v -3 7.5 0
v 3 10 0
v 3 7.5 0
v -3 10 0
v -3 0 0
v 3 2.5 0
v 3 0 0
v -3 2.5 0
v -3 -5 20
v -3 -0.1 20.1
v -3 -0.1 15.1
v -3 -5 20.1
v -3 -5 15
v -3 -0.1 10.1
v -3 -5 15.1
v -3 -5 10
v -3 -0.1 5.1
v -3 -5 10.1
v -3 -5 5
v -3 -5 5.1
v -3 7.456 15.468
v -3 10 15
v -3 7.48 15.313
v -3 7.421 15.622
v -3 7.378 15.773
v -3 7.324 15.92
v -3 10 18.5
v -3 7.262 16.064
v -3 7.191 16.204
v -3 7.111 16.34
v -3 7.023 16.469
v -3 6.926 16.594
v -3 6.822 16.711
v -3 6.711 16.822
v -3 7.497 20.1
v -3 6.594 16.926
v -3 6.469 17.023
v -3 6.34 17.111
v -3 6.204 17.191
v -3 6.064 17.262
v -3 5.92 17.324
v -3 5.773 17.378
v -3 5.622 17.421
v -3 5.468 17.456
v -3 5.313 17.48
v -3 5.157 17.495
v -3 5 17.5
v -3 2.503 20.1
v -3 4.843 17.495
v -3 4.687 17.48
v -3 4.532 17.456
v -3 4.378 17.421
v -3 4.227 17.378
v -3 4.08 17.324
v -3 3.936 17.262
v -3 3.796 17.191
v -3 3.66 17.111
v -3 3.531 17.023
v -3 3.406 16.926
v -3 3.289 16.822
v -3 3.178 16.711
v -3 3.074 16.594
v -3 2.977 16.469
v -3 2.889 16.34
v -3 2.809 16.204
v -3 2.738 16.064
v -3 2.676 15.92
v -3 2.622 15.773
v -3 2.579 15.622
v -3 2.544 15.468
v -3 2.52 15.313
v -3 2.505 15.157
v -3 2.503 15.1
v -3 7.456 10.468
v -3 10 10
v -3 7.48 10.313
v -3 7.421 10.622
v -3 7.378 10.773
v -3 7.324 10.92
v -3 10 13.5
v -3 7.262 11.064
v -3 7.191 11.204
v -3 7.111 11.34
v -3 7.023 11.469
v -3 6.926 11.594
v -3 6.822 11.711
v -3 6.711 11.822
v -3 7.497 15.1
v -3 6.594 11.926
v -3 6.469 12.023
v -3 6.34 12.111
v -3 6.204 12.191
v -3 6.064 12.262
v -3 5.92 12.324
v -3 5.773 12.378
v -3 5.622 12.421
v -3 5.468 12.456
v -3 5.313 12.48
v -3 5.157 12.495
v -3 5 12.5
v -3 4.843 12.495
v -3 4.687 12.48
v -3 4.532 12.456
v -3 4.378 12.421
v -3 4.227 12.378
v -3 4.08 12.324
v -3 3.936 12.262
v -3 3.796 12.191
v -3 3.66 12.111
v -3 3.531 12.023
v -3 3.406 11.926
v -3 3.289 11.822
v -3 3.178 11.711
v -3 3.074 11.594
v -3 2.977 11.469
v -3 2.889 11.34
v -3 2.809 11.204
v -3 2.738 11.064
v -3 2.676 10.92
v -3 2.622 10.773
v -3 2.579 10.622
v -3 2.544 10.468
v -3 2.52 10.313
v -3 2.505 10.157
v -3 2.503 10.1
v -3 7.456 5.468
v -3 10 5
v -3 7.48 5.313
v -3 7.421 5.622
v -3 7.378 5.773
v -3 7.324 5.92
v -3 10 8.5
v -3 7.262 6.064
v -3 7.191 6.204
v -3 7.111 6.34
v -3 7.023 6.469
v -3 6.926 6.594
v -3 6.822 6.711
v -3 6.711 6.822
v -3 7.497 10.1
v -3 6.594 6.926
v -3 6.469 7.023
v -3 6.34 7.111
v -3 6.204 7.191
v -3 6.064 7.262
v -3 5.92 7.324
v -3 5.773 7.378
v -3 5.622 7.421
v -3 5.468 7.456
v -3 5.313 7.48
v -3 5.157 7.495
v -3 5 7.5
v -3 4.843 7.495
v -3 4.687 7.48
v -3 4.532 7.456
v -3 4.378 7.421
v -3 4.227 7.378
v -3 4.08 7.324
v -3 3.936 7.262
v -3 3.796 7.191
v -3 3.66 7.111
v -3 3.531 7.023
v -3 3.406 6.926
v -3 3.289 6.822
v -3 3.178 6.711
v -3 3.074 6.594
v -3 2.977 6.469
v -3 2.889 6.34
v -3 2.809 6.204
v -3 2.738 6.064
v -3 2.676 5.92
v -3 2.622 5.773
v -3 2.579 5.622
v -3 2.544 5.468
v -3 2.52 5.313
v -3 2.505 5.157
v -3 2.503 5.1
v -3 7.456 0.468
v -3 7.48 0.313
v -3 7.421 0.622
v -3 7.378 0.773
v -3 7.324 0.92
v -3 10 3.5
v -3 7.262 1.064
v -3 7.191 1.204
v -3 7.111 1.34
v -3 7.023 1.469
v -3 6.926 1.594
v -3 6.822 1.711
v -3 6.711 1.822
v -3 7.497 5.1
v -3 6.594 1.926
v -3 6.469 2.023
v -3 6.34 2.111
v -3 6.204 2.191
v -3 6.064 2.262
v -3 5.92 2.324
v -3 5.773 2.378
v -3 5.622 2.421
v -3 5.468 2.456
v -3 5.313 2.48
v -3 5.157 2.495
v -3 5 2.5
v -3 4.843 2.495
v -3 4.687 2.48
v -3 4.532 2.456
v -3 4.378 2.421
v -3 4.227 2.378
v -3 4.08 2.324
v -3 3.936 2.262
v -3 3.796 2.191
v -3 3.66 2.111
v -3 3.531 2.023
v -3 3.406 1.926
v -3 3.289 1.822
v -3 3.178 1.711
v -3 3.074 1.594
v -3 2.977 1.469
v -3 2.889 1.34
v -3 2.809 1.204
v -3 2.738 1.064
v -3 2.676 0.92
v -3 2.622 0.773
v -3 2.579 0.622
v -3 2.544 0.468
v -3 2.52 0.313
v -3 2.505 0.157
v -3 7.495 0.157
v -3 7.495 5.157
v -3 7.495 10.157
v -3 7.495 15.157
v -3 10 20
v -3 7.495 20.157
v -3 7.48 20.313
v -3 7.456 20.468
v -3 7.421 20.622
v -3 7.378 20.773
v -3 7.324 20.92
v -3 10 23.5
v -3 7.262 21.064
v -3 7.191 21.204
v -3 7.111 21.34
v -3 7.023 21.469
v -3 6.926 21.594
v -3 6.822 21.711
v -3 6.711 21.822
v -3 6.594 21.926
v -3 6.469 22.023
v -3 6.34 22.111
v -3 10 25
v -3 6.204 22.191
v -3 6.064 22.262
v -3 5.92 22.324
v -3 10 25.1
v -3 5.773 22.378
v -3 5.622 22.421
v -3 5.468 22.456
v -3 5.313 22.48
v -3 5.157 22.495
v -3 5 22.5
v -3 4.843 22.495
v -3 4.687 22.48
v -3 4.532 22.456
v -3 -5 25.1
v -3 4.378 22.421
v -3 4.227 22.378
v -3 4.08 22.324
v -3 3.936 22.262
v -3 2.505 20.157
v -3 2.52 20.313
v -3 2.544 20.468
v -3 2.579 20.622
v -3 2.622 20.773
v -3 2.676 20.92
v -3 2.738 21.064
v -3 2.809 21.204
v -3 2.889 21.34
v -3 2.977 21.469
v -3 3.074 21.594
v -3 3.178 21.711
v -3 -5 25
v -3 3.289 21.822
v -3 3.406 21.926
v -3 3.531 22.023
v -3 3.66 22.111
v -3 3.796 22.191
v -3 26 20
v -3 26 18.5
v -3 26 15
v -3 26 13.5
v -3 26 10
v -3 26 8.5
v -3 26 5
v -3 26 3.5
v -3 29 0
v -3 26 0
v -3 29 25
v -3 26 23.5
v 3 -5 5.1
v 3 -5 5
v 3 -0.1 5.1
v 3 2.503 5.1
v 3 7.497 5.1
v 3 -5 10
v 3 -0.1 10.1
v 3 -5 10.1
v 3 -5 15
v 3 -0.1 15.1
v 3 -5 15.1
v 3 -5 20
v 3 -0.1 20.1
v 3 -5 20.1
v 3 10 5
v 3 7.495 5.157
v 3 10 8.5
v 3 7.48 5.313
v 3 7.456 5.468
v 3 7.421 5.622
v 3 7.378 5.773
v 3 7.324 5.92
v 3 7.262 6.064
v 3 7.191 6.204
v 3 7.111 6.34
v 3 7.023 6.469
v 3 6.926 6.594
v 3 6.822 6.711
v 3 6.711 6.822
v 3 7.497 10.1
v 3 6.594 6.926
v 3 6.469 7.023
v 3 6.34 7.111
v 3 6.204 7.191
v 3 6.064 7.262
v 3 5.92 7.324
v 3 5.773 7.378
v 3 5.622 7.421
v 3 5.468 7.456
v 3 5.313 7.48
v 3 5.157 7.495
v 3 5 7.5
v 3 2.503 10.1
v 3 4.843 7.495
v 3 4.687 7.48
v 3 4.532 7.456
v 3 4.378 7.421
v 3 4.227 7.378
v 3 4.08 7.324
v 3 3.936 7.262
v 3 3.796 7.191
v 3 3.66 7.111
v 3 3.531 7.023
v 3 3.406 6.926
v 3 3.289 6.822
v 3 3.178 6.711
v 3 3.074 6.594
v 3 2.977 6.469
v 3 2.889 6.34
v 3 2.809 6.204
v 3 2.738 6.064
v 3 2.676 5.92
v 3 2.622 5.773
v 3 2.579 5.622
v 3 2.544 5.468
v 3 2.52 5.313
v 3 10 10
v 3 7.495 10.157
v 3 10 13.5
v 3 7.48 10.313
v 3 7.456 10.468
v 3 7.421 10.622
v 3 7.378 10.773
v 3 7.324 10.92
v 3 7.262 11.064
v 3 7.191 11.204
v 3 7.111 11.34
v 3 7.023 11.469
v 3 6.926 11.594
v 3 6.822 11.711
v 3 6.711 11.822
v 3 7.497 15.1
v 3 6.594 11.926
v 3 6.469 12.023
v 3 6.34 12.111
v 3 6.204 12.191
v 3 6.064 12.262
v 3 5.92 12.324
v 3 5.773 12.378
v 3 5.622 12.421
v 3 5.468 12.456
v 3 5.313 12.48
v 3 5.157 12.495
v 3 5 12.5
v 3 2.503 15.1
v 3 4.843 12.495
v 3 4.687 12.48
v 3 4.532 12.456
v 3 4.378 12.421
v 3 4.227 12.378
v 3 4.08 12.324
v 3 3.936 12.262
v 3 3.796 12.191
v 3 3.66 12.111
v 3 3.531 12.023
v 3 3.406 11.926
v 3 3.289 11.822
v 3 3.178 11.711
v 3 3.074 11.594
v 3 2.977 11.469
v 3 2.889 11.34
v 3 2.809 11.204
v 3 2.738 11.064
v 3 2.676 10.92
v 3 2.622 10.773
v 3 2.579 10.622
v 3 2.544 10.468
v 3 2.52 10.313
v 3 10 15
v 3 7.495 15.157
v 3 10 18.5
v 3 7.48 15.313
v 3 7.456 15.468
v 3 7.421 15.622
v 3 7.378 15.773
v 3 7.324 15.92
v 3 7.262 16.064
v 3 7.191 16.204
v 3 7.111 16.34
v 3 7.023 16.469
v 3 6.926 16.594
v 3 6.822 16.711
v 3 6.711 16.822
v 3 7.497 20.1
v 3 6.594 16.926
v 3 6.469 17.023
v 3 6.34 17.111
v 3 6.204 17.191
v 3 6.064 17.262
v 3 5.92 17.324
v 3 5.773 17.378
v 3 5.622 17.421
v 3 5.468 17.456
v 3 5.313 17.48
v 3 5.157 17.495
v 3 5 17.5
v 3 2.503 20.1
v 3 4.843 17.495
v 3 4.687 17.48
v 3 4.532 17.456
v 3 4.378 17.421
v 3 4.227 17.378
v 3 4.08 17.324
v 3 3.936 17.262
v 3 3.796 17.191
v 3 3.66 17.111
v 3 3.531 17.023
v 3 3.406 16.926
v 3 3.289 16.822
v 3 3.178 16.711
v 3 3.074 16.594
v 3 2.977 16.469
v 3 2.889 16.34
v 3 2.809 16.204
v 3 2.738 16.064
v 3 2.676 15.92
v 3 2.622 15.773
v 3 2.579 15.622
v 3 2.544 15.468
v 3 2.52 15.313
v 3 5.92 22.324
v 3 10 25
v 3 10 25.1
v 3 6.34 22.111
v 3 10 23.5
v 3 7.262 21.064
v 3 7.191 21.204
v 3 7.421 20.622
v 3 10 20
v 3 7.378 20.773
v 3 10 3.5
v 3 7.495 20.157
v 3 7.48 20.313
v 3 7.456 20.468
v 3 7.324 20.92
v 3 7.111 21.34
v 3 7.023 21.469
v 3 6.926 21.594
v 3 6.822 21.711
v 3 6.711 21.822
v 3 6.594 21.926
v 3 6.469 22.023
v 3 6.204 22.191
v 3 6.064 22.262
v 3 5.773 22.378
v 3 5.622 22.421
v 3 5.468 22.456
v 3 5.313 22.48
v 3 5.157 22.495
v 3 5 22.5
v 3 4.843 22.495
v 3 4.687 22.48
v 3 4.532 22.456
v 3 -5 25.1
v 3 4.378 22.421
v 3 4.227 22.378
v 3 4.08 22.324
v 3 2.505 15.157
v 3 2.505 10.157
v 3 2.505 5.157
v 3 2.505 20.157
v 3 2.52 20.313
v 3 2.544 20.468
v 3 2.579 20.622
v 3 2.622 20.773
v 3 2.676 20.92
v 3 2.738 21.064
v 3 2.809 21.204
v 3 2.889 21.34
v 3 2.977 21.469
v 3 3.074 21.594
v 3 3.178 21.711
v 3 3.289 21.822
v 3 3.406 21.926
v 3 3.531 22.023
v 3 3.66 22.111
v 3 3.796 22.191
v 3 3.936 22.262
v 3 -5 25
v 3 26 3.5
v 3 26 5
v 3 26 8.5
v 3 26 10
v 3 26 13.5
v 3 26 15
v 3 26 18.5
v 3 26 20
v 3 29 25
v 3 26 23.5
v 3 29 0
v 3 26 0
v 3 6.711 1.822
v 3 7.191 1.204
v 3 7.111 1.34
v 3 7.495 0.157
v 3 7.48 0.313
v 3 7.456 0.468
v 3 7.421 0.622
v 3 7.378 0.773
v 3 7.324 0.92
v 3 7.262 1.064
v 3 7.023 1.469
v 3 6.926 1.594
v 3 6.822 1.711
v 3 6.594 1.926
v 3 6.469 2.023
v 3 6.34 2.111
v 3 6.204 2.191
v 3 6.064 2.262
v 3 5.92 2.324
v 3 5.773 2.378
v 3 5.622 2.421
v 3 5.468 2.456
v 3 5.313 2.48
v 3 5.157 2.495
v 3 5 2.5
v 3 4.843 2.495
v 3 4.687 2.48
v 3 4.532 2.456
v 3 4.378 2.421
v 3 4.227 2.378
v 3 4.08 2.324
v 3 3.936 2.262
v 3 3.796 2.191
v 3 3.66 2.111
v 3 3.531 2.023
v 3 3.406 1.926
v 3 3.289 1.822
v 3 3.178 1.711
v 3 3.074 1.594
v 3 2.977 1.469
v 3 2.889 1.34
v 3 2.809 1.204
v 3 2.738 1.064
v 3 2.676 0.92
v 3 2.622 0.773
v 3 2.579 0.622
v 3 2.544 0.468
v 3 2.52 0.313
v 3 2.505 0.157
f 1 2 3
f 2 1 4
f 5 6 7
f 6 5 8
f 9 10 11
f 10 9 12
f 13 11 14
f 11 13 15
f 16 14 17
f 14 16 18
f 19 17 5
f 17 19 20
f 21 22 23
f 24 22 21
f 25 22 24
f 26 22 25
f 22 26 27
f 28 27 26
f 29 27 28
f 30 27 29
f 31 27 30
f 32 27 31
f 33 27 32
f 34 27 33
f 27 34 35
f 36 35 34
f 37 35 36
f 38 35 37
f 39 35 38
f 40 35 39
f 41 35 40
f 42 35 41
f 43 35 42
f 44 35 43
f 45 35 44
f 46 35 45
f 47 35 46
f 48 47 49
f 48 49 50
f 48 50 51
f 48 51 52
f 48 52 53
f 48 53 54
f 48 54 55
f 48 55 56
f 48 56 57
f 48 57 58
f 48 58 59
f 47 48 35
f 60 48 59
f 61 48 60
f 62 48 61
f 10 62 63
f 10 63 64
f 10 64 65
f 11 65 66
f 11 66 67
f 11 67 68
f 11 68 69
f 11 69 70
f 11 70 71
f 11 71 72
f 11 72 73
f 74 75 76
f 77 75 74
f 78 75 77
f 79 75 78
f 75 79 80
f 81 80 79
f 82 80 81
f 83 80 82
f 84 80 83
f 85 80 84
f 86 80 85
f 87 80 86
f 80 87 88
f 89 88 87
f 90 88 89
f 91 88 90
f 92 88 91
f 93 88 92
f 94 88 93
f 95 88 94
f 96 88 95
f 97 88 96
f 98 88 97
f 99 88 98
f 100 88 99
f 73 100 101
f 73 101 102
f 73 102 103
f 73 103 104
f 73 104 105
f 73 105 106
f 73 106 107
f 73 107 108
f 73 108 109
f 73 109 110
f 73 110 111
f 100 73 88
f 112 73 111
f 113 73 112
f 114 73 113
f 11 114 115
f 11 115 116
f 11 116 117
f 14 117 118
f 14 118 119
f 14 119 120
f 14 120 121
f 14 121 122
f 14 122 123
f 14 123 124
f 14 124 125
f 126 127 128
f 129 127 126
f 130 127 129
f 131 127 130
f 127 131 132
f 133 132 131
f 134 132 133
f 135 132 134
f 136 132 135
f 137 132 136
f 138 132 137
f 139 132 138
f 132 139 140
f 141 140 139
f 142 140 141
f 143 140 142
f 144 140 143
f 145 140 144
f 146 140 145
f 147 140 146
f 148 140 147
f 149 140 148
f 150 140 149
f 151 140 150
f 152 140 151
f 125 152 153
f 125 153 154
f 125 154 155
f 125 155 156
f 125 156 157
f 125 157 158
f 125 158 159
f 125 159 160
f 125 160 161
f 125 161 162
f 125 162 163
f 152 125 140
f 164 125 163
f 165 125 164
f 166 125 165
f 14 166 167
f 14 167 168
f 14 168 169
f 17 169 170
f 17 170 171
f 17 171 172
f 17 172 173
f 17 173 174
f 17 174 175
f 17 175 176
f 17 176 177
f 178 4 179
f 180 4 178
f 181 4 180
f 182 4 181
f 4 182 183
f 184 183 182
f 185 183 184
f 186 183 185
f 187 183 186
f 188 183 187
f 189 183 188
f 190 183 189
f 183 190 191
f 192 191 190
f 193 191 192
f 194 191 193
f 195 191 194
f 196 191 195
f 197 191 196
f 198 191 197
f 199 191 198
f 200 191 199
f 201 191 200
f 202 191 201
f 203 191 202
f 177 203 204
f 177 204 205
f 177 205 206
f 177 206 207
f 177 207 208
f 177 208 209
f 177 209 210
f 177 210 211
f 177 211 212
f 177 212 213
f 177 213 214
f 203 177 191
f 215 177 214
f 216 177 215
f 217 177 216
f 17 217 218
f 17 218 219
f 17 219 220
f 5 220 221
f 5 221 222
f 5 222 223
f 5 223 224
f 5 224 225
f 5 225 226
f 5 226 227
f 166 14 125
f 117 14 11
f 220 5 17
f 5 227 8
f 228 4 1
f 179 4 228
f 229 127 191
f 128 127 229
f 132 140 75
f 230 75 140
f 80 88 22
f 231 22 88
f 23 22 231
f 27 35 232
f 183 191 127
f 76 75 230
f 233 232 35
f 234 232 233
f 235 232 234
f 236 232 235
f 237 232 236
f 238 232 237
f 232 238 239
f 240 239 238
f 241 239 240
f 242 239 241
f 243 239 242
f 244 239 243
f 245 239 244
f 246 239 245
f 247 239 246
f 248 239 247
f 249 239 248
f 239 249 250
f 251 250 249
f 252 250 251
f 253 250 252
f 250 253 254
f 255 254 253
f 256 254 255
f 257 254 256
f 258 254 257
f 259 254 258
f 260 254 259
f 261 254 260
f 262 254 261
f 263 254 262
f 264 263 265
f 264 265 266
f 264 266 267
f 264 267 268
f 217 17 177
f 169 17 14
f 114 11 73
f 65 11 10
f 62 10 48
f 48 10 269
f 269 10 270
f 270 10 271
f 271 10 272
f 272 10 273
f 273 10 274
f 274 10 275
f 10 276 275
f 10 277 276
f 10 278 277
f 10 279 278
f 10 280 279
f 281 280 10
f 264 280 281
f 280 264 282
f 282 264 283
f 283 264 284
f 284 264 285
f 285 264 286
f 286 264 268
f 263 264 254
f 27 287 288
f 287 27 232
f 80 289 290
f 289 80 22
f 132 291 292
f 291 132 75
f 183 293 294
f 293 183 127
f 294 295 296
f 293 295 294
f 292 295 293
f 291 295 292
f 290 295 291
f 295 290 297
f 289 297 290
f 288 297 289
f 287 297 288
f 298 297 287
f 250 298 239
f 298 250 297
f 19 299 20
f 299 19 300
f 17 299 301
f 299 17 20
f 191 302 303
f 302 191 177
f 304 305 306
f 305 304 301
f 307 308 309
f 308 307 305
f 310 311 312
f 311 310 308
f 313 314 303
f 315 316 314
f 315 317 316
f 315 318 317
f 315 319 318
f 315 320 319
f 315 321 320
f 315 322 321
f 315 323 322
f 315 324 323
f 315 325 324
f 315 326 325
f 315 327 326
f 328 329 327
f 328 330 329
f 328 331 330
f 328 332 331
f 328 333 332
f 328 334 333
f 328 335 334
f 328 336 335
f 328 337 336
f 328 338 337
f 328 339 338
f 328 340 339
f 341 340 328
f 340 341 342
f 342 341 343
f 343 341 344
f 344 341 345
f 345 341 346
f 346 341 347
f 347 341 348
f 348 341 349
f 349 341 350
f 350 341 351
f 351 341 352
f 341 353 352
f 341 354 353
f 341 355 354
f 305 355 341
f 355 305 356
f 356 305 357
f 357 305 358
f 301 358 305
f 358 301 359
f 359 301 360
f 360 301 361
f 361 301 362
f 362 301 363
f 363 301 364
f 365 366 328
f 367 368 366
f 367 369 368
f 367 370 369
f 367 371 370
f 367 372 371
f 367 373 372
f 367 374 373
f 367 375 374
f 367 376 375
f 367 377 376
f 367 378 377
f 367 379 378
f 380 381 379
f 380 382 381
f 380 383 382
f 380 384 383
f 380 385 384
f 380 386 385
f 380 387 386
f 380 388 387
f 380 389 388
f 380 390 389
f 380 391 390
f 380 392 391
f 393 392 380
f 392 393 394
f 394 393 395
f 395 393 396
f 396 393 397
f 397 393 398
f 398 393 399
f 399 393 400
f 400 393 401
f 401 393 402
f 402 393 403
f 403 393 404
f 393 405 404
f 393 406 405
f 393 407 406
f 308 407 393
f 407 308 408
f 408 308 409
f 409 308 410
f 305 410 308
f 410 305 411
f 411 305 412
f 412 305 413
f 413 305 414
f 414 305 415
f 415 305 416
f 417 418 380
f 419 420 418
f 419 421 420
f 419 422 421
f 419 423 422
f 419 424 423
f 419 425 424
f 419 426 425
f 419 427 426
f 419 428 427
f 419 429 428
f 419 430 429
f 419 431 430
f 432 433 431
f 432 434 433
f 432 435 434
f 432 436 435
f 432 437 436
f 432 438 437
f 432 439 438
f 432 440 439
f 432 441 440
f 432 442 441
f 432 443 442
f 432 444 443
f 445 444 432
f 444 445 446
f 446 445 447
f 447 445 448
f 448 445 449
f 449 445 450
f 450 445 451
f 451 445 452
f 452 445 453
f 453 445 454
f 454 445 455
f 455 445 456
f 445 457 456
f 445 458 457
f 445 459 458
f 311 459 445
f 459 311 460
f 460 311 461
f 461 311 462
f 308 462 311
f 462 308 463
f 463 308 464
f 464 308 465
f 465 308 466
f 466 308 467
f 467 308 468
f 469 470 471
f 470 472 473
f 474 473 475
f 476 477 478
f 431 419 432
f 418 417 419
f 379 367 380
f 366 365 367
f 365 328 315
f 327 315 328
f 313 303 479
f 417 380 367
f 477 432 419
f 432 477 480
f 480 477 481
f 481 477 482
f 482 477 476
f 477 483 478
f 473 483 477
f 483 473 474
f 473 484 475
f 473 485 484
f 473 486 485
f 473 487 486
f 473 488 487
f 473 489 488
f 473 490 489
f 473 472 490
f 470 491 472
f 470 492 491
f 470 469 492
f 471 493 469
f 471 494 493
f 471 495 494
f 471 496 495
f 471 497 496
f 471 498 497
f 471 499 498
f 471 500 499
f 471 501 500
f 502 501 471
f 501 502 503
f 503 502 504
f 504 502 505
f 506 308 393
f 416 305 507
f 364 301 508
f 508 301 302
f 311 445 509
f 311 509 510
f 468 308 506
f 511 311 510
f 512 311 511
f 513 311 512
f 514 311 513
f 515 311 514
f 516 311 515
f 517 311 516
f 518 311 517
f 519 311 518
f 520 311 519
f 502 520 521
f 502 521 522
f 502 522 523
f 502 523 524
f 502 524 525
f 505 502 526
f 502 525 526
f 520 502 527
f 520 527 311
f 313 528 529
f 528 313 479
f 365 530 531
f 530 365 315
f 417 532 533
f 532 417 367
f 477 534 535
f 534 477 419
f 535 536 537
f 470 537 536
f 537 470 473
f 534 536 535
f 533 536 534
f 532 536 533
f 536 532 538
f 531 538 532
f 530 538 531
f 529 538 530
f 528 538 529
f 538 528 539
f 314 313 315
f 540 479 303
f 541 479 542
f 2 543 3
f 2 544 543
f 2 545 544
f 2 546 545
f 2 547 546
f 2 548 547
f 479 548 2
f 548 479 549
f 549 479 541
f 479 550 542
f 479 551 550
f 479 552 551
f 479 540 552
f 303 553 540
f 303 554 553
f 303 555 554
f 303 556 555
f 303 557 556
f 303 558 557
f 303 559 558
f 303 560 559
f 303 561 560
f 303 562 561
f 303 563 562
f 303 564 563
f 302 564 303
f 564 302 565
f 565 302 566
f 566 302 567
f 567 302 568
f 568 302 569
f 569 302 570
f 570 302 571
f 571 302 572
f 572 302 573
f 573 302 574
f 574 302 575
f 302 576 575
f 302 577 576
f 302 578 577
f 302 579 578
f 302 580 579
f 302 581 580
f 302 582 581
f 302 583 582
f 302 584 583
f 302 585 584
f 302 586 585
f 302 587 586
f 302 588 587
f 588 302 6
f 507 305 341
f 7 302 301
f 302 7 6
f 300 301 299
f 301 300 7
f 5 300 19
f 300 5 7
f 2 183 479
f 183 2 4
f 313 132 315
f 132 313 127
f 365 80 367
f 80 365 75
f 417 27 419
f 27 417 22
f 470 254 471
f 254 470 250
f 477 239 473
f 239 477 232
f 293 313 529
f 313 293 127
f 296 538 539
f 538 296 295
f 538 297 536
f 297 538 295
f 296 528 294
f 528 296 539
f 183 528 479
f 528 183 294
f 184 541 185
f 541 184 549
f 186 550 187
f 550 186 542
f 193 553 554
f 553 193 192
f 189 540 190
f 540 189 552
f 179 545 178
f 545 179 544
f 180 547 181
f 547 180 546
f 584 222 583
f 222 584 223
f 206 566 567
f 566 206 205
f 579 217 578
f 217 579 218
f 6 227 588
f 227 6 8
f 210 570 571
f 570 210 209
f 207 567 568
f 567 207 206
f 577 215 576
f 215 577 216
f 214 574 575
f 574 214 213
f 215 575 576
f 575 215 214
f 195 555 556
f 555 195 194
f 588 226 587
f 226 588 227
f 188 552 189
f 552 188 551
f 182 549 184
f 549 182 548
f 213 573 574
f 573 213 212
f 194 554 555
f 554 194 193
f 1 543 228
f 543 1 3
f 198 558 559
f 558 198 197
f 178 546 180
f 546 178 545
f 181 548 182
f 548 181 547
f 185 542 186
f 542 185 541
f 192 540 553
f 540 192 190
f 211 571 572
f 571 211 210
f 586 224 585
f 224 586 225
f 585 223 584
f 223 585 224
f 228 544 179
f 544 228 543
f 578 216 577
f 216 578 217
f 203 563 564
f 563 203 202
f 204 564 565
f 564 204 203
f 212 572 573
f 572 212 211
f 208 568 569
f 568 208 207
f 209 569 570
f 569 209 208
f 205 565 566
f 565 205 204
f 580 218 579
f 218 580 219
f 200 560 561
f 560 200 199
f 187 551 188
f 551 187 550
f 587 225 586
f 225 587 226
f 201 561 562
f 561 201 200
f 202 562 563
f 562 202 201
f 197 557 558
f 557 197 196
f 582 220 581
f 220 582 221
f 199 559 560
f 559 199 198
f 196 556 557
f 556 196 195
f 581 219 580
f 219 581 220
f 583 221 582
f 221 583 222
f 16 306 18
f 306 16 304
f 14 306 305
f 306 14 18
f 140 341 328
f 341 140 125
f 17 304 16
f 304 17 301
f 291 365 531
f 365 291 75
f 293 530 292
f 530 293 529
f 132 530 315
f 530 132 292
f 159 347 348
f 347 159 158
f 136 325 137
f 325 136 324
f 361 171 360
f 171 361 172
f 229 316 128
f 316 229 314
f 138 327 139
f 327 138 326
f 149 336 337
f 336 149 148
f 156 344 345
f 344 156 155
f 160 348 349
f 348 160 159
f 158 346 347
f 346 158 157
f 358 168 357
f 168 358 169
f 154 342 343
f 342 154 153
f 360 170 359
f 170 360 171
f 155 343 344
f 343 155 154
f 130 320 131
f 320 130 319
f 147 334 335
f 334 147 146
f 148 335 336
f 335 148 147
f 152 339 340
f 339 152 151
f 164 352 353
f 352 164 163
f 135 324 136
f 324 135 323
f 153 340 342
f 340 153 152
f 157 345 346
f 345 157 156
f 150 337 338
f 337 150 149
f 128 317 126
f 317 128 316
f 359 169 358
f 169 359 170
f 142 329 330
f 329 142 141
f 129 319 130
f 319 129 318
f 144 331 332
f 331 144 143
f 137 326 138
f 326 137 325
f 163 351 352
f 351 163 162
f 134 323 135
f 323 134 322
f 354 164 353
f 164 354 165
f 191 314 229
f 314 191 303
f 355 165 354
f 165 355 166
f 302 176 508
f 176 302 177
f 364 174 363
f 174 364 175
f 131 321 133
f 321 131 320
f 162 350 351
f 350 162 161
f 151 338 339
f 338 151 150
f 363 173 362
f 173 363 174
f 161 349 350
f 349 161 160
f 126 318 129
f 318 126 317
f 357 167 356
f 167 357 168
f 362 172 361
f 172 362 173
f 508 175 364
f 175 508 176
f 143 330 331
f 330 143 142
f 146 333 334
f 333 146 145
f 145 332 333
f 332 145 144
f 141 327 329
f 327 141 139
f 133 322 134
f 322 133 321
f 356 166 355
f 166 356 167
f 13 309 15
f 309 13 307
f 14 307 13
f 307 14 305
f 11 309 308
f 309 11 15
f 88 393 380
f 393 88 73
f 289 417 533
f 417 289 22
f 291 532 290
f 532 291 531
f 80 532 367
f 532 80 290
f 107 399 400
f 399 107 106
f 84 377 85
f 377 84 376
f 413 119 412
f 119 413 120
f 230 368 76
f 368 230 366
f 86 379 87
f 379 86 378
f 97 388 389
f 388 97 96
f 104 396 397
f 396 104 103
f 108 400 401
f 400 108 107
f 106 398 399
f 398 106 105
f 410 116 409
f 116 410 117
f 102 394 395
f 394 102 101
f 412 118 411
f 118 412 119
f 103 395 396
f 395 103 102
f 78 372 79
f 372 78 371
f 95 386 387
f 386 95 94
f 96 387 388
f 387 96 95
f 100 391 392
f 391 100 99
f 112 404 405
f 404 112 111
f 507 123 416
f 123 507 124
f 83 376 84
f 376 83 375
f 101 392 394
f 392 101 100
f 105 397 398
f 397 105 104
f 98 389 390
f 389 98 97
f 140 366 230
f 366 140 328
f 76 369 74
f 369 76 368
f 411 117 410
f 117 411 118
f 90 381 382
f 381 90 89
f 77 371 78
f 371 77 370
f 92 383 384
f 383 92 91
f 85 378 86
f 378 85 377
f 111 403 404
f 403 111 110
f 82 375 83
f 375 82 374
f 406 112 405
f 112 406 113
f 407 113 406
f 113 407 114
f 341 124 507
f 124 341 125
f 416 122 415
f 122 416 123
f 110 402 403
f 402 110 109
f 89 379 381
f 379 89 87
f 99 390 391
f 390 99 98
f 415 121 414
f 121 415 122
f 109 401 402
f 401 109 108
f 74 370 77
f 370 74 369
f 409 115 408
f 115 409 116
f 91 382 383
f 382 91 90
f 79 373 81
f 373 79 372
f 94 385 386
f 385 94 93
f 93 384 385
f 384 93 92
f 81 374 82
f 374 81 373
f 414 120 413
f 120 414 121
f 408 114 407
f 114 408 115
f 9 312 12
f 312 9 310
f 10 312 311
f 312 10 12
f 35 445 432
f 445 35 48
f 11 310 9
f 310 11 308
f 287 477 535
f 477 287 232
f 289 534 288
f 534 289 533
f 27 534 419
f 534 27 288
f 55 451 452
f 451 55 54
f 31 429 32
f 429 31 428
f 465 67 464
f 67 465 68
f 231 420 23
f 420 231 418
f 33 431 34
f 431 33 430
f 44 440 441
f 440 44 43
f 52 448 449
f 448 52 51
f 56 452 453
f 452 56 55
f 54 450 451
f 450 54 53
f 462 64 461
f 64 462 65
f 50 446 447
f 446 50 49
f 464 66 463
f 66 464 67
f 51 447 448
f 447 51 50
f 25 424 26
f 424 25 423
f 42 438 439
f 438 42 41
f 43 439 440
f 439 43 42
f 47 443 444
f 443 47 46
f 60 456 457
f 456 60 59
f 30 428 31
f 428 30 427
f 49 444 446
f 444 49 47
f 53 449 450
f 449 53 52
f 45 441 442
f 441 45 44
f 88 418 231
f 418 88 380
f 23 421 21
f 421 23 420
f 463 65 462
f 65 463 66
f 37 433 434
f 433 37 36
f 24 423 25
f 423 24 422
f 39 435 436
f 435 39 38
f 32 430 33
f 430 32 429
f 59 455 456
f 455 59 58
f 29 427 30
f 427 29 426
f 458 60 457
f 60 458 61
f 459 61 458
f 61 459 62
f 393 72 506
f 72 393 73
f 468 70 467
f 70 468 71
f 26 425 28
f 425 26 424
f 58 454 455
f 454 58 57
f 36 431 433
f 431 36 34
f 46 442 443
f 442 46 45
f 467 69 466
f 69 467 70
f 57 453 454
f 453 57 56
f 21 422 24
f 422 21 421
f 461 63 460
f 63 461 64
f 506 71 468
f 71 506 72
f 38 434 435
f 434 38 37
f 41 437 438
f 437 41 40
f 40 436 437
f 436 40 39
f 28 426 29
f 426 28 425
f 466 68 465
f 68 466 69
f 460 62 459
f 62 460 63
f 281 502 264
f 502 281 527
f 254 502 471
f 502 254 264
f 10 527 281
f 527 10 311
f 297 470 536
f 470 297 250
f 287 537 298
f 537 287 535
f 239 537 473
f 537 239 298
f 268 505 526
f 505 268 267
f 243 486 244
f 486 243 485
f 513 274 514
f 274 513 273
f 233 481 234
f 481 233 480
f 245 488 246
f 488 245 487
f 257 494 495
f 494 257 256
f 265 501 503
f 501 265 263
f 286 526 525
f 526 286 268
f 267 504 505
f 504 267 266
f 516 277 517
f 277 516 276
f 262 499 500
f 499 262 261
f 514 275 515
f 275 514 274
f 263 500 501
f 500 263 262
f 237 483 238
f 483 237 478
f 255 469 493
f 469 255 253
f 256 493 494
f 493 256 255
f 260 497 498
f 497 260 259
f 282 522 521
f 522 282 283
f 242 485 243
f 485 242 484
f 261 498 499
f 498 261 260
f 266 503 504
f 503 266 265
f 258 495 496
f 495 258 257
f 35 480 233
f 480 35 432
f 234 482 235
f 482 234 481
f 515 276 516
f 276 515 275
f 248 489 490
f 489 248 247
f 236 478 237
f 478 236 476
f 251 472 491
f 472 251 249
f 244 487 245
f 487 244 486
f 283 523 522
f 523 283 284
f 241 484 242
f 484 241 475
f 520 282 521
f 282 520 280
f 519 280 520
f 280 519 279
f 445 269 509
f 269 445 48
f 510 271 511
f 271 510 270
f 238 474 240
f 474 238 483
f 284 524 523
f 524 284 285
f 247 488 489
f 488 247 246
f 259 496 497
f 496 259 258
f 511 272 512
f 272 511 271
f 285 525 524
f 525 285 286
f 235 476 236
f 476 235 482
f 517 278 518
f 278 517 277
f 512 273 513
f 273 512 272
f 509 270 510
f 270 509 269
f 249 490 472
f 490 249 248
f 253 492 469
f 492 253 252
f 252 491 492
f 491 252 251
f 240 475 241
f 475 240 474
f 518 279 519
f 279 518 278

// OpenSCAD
$fn=100;

ht=5;
bt=1.5;
l=30;
w=6;
d1=8; // cylinder
d2=5; // hole

//translate([-5,-d1/4,0]) cube([10,l+d1/2,.5]);

for(i=[0:2:8]){
    j=ht*(i/2);
    difference(){
        union(){
            hull(){
                translate([-w/2,0,j])
                cube([w,ht*2,ht]);
                translate([-w/2,-ht,j+ht])
                cube([w,15,.1]);
            }
            
            //translate([0,l-d1/2,j]) cylinder(d=d1,h=ht);
            translate([-w/2,l-d1/2,j]) cube([w,w/2,ht]);
            
            translate([-w/2,0,j+ht-bt])
            cube([w,l-d1/2,bt]);
        }
        
        translate([-w,5,j])
        rotate([0,90,0]) cylinder(d=d2,h=w*2);
        
    }    
}
